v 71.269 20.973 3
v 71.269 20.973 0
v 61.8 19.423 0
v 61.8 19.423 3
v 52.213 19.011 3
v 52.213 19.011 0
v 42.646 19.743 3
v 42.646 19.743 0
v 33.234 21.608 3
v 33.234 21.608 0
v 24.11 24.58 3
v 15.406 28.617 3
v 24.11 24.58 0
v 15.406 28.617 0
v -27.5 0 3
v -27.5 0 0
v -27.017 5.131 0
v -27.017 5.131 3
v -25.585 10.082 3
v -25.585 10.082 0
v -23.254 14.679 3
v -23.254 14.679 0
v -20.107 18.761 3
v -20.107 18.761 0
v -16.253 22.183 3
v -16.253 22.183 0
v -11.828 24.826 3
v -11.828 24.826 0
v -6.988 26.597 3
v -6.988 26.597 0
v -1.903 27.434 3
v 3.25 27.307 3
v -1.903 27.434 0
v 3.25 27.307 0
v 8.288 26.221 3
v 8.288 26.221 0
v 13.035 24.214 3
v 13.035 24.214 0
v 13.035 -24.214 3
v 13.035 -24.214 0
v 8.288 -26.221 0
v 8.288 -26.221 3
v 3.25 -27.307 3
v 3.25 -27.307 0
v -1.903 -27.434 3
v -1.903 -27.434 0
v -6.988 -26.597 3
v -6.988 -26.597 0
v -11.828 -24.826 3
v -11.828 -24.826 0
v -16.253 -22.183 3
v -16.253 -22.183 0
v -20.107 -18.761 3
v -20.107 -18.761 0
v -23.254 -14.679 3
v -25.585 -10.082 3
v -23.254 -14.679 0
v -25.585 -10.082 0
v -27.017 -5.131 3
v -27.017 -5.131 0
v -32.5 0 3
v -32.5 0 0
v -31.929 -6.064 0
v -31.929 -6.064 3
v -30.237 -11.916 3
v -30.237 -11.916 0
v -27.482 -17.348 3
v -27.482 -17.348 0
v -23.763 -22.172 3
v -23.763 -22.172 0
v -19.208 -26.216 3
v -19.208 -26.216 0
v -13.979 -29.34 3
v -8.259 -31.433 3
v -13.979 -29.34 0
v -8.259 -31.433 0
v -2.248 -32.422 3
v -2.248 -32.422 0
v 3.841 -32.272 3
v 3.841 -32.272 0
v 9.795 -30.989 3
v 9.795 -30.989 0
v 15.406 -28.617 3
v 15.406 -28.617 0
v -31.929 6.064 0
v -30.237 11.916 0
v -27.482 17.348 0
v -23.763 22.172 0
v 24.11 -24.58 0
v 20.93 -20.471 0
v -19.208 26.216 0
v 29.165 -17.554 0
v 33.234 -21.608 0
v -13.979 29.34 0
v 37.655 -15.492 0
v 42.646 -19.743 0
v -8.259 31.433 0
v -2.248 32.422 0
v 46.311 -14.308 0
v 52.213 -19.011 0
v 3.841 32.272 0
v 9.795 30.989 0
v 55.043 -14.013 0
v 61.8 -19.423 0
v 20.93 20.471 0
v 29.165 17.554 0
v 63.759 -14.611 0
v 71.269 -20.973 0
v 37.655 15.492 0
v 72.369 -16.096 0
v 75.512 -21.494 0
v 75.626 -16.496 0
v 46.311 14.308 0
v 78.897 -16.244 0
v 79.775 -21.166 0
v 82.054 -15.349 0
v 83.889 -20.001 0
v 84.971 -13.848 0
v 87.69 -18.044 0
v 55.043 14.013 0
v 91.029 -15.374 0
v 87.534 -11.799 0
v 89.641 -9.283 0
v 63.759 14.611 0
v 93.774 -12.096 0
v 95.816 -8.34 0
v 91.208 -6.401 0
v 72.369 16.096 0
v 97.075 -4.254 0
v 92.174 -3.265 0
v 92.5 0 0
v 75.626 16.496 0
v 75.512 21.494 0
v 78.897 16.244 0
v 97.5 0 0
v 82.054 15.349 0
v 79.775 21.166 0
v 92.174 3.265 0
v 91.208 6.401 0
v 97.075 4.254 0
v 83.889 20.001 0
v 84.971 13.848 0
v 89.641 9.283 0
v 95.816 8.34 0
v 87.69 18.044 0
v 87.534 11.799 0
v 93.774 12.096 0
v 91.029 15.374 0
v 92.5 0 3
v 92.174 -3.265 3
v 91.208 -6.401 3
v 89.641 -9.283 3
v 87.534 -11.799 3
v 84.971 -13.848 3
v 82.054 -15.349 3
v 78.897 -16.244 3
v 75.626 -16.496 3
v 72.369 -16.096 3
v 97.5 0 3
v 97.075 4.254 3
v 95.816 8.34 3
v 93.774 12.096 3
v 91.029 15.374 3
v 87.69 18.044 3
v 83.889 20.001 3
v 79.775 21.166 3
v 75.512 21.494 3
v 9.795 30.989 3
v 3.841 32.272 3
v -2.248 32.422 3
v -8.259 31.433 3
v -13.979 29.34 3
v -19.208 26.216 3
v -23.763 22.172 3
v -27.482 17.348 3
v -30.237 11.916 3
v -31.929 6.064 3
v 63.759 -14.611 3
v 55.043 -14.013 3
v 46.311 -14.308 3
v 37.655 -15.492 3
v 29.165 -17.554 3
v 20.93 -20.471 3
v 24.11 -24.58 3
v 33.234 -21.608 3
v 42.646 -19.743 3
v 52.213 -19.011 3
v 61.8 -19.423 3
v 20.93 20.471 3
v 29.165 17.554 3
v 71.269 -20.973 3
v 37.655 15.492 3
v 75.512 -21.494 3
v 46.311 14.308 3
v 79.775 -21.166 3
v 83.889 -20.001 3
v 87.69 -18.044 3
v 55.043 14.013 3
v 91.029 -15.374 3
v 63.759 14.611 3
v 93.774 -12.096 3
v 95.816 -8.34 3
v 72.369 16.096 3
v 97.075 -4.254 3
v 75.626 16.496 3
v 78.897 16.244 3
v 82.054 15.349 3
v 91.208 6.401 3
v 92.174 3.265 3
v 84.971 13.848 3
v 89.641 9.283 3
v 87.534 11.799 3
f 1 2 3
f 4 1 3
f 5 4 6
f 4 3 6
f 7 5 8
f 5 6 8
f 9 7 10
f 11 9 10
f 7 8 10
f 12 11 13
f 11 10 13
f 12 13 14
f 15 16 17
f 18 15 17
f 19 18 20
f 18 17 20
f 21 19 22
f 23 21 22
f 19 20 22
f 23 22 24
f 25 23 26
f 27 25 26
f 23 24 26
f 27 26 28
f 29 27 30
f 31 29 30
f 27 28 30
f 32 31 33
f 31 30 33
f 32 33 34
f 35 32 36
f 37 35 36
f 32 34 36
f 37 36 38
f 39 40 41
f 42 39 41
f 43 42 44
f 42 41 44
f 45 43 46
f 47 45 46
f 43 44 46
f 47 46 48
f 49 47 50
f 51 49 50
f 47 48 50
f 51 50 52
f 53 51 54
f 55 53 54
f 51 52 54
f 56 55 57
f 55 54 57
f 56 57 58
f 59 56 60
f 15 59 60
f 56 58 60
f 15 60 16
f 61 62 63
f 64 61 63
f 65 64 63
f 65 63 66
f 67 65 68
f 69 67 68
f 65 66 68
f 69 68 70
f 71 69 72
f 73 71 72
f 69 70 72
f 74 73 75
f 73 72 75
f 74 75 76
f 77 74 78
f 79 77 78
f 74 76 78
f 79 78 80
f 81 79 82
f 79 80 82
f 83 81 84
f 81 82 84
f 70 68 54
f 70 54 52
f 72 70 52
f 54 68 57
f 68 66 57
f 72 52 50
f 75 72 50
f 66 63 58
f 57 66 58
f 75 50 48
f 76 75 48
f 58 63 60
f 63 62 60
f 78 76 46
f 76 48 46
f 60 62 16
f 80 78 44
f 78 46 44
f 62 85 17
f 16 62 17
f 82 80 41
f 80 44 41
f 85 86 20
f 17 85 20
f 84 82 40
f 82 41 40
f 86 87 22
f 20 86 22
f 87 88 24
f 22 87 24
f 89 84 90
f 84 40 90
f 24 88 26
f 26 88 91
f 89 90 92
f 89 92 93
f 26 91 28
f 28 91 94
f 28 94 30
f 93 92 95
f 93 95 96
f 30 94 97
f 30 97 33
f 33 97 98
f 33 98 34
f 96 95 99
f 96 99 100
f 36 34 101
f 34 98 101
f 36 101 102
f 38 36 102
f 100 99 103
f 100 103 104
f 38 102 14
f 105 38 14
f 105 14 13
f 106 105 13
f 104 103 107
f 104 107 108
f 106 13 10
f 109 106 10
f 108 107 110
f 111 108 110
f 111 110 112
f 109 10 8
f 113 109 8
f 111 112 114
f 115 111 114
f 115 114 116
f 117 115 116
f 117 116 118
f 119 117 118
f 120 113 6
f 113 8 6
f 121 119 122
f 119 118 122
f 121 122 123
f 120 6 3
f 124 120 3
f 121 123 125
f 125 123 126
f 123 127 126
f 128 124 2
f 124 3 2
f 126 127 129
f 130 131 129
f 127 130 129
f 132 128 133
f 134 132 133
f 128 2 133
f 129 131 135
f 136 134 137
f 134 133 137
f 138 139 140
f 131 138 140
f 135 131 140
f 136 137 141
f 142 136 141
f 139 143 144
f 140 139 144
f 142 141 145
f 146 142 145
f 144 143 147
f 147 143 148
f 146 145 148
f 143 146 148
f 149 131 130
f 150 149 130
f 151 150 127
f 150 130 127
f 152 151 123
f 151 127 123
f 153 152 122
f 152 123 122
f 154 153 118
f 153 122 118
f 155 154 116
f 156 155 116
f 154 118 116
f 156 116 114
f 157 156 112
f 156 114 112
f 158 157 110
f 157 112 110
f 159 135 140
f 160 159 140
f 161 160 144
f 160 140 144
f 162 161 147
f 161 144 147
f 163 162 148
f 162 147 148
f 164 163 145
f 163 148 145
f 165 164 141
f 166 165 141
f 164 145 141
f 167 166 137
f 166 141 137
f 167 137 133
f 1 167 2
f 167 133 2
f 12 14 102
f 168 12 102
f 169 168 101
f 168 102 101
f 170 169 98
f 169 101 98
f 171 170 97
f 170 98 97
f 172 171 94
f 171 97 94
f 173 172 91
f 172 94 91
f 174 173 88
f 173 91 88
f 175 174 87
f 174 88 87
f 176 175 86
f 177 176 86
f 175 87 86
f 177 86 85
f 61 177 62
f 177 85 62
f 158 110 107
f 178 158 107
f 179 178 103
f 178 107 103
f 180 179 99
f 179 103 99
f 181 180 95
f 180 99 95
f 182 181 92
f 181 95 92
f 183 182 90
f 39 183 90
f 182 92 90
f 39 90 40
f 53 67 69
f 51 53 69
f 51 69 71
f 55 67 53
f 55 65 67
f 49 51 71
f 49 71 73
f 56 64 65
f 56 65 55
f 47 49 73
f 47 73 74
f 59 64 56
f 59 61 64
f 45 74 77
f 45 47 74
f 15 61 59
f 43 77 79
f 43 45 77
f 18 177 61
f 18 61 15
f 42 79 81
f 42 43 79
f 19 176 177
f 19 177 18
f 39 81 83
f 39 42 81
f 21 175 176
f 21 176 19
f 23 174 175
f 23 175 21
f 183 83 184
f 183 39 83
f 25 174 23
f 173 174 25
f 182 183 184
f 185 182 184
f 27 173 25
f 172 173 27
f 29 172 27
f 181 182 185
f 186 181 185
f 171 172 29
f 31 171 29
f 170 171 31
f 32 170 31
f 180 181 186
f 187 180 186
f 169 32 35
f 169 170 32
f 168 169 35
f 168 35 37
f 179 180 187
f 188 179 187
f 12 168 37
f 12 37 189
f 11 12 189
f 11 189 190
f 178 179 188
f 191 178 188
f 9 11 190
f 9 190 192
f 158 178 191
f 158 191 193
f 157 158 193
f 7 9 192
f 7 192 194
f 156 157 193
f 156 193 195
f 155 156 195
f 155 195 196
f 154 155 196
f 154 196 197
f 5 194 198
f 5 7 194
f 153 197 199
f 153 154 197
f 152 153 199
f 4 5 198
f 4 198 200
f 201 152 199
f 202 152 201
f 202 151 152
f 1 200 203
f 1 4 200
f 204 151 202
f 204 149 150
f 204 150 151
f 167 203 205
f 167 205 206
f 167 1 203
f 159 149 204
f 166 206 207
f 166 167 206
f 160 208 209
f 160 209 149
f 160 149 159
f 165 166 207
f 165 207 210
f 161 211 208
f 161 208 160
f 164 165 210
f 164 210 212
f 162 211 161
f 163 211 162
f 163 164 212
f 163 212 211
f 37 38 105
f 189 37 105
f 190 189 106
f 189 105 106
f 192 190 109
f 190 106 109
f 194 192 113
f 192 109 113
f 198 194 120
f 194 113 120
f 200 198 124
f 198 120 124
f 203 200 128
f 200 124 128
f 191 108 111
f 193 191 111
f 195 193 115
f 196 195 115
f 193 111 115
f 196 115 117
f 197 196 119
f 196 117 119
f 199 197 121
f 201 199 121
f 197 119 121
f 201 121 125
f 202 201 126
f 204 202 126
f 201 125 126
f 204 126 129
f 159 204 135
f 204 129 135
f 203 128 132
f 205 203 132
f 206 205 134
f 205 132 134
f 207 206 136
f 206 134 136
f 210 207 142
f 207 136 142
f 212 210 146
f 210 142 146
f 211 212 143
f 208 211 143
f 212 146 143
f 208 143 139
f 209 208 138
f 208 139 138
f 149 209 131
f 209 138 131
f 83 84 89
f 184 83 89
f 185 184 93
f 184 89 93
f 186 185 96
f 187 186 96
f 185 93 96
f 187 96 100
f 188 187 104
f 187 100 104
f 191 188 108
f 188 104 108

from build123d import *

# Parameters (mm, degrees)
F1_DEPTH = 3


with BuildPart() as f1:
    # F0 (on Top) → F1 (new body)
    with BuildSketch(Plane.XY):
        with BuildLine():
            ThreePointArc((97.5, 0), (89.426248, 16.792435), (71.268757, 20.972967))
            ThreePointArc((71.268757, 20.972967), (42.645894, 19.743038), (15.405524, 28.616775))
            ThreePointArc((15.405524, 28.616775), (-16.666891, 27.900981), (-32.5, 0))
            ThreePointArc((-32.5, 0), (-16.666891, -27.900981), (15.405524, -28.616775))
            ThreePointArc((15.405524, -28.616775), (42.645894, -19.743038), (71.268757, -20.972967))
            ThreePointArc((71.268757, -20.972967), (89.426248, -16.792435), (97.5, 0))
        make_face()
        with BuildLine():
            ThreePointArc((13.035443, 24.214195), (41.968056, 14.789198), (72.369046, 16.095533))
            ThreePointArc((72.369046, 16.095533), (86.303865, 12.887217), (92.5, 0))
            ThreePointArc((92.5, 0), (86.303865, -12.887217), (72.369046, -16.095533))
            ThreePointArc((72.369046, -16.095533), (41.968056, -14.789198), (13.035443, -24.214195))
            ThreePointArc((13.035443, -24.214195), (-14.102754, -23.608523), (-27.5, 0))
            ThreePointArc((-27.5, 0), (-14.102754, 23.608523), (13.035443, 24.214195))
        make_face(mode=Mode.SUBTRACT)
    extrude(amount=F1_DEPTH)


solid = f1.part
